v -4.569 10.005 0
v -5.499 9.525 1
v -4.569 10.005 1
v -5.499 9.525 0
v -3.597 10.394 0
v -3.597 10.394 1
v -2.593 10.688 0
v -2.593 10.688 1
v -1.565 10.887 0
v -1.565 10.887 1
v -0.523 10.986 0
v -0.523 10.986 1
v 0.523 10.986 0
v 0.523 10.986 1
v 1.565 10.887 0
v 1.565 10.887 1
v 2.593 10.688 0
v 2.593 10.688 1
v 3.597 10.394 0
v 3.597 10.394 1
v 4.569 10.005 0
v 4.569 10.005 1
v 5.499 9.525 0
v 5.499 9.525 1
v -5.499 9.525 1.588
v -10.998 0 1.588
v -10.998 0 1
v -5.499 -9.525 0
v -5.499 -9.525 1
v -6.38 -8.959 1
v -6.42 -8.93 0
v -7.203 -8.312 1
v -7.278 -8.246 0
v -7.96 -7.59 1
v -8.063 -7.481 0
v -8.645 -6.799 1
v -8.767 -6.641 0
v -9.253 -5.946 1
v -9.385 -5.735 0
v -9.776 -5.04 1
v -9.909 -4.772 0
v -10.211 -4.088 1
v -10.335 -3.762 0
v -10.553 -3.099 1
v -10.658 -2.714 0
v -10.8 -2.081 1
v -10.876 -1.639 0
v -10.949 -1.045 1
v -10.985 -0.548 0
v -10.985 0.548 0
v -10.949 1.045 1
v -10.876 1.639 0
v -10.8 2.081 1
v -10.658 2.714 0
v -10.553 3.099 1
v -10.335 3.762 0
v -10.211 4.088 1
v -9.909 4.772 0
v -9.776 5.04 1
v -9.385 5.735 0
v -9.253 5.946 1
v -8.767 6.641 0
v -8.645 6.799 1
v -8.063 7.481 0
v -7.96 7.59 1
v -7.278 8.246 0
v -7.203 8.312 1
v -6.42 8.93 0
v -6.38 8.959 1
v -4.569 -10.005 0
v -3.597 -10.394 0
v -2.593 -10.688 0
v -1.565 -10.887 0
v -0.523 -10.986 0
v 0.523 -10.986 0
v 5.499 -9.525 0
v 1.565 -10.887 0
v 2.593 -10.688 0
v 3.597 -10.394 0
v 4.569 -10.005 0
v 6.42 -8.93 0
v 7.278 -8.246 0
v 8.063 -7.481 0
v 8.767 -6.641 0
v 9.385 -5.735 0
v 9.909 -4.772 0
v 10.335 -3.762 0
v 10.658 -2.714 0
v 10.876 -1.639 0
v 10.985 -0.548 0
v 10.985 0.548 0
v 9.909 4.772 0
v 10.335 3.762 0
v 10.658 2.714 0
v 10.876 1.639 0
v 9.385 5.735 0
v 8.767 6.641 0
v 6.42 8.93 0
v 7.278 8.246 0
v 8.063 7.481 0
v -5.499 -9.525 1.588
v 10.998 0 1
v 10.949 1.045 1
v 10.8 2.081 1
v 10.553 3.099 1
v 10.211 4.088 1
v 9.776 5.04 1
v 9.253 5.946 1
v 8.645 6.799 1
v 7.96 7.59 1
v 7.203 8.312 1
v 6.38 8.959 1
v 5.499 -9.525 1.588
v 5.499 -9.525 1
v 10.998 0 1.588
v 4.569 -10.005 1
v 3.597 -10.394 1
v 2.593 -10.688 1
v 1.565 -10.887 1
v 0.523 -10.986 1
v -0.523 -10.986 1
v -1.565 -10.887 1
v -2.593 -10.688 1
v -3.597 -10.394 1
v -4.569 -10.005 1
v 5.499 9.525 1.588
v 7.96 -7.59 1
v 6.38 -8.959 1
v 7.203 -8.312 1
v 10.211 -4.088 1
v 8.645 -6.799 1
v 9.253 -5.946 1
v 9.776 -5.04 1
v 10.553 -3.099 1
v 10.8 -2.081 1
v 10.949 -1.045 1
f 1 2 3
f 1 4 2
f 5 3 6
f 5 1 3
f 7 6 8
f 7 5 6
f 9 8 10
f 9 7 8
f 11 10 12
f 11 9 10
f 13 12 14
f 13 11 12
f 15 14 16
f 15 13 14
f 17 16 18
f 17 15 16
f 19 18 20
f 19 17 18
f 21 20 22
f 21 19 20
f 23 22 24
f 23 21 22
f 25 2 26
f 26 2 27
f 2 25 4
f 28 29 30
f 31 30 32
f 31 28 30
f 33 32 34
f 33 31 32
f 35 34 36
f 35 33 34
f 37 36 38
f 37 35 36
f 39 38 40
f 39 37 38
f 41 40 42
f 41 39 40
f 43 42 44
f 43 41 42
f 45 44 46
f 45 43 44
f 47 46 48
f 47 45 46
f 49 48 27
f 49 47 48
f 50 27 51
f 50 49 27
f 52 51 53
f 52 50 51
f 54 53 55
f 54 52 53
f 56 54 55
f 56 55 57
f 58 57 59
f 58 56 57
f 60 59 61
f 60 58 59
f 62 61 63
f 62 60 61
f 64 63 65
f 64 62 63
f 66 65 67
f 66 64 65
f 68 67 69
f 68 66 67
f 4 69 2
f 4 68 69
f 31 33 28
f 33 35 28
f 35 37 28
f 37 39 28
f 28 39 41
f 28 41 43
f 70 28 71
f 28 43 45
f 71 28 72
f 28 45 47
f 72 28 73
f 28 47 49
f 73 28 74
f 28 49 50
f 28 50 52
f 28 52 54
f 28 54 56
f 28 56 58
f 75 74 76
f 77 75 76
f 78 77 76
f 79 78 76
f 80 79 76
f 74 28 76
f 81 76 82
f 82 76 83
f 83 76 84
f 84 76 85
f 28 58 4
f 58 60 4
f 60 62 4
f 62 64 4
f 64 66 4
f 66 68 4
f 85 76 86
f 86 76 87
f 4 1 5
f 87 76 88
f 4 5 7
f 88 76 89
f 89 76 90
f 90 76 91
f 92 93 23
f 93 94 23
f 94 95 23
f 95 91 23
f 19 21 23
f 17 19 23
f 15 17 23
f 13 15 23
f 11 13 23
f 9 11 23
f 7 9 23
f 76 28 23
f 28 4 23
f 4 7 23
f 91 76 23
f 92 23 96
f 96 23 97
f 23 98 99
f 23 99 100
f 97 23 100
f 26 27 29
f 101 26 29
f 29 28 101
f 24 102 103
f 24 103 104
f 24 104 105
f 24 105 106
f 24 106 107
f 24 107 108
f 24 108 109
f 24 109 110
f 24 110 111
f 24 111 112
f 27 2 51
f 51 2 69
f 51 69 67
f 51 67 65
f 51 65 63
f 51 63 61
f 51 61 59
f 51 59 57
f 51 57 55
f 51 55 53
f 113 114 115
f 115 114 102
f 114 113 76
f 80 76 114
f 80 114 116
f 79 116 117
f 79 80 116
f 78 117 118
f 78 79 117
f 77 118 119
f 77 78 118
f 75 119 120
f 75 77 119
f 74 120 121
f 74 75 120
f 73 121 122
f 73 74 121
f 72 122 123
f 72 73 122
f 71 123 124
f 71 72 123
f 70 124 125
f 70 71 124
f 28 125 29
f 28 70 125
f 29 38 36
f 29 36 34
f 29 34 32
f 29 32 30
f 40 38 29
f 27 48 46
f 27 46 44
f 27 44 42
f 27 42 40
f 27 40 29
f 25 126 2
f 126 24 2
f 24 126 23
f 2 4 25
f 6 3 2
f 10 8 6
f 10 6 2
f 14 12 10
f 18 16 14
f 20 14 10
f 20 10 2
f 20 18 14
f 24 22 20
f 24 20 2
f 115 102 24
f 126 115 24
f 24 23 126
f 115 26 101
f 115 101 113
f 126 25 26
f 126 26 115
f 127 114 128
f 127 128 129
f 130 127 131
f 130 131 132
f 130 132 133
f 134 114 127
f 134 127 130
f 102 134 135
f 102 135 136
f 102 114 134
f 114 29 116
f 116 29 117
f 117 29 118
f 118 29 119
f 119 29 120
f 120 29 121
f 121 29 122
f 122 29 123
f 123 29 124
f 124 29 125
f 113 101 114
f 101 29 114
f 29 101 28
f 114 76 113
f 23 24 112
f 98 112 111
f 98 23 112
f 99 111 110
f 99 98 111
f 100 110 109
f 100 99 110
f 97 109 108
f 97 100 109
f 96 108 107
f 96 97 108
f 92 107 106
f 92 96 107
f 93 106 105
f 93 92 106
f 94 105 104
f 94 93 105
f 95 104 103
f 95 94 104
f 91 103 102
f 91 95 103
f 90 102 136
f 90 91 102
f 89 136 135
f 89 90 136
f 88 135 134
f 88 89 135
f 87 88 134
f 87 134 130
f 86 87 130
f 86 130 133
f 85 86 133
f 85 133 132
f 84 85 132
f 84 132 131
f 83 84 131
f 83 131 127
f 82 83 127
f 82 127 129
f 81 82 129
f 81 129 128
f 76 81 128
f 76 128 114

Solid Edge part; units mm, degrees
sketch "Sketch1" plane through (0, 0, 0) normal (0, 0, 1) x (1, 0, 0)
  line L0 (5.4993, -9.525) -> (10.9985, 0)
  line L1 (10.9985, 0) -> (5.4993, 9.525)
  line L2 (5.4993, 9.525) -> (-5.4993, 9.525)
  line L3 (-5.4993, 9.525) -> (-10.9985, 0)
  line L4 (-10.9985, 0) -> (-5.4993, -9.525)
  line L5 (-5.4993, -9.525) -> (5.4993, -9.525)
extrude "Protrusion1" add sketch "Sketch1" along normal blind 1.5875
sketch "Sketch2" plane through (0, 0, 0) normal (0, 0, 1) x (1, 0, 0)
  circle A0 centre (0, 0) radius 10.9985
extrude "ExtrudedCutout_1" add sketch "Sketch2" along normal blind 1
